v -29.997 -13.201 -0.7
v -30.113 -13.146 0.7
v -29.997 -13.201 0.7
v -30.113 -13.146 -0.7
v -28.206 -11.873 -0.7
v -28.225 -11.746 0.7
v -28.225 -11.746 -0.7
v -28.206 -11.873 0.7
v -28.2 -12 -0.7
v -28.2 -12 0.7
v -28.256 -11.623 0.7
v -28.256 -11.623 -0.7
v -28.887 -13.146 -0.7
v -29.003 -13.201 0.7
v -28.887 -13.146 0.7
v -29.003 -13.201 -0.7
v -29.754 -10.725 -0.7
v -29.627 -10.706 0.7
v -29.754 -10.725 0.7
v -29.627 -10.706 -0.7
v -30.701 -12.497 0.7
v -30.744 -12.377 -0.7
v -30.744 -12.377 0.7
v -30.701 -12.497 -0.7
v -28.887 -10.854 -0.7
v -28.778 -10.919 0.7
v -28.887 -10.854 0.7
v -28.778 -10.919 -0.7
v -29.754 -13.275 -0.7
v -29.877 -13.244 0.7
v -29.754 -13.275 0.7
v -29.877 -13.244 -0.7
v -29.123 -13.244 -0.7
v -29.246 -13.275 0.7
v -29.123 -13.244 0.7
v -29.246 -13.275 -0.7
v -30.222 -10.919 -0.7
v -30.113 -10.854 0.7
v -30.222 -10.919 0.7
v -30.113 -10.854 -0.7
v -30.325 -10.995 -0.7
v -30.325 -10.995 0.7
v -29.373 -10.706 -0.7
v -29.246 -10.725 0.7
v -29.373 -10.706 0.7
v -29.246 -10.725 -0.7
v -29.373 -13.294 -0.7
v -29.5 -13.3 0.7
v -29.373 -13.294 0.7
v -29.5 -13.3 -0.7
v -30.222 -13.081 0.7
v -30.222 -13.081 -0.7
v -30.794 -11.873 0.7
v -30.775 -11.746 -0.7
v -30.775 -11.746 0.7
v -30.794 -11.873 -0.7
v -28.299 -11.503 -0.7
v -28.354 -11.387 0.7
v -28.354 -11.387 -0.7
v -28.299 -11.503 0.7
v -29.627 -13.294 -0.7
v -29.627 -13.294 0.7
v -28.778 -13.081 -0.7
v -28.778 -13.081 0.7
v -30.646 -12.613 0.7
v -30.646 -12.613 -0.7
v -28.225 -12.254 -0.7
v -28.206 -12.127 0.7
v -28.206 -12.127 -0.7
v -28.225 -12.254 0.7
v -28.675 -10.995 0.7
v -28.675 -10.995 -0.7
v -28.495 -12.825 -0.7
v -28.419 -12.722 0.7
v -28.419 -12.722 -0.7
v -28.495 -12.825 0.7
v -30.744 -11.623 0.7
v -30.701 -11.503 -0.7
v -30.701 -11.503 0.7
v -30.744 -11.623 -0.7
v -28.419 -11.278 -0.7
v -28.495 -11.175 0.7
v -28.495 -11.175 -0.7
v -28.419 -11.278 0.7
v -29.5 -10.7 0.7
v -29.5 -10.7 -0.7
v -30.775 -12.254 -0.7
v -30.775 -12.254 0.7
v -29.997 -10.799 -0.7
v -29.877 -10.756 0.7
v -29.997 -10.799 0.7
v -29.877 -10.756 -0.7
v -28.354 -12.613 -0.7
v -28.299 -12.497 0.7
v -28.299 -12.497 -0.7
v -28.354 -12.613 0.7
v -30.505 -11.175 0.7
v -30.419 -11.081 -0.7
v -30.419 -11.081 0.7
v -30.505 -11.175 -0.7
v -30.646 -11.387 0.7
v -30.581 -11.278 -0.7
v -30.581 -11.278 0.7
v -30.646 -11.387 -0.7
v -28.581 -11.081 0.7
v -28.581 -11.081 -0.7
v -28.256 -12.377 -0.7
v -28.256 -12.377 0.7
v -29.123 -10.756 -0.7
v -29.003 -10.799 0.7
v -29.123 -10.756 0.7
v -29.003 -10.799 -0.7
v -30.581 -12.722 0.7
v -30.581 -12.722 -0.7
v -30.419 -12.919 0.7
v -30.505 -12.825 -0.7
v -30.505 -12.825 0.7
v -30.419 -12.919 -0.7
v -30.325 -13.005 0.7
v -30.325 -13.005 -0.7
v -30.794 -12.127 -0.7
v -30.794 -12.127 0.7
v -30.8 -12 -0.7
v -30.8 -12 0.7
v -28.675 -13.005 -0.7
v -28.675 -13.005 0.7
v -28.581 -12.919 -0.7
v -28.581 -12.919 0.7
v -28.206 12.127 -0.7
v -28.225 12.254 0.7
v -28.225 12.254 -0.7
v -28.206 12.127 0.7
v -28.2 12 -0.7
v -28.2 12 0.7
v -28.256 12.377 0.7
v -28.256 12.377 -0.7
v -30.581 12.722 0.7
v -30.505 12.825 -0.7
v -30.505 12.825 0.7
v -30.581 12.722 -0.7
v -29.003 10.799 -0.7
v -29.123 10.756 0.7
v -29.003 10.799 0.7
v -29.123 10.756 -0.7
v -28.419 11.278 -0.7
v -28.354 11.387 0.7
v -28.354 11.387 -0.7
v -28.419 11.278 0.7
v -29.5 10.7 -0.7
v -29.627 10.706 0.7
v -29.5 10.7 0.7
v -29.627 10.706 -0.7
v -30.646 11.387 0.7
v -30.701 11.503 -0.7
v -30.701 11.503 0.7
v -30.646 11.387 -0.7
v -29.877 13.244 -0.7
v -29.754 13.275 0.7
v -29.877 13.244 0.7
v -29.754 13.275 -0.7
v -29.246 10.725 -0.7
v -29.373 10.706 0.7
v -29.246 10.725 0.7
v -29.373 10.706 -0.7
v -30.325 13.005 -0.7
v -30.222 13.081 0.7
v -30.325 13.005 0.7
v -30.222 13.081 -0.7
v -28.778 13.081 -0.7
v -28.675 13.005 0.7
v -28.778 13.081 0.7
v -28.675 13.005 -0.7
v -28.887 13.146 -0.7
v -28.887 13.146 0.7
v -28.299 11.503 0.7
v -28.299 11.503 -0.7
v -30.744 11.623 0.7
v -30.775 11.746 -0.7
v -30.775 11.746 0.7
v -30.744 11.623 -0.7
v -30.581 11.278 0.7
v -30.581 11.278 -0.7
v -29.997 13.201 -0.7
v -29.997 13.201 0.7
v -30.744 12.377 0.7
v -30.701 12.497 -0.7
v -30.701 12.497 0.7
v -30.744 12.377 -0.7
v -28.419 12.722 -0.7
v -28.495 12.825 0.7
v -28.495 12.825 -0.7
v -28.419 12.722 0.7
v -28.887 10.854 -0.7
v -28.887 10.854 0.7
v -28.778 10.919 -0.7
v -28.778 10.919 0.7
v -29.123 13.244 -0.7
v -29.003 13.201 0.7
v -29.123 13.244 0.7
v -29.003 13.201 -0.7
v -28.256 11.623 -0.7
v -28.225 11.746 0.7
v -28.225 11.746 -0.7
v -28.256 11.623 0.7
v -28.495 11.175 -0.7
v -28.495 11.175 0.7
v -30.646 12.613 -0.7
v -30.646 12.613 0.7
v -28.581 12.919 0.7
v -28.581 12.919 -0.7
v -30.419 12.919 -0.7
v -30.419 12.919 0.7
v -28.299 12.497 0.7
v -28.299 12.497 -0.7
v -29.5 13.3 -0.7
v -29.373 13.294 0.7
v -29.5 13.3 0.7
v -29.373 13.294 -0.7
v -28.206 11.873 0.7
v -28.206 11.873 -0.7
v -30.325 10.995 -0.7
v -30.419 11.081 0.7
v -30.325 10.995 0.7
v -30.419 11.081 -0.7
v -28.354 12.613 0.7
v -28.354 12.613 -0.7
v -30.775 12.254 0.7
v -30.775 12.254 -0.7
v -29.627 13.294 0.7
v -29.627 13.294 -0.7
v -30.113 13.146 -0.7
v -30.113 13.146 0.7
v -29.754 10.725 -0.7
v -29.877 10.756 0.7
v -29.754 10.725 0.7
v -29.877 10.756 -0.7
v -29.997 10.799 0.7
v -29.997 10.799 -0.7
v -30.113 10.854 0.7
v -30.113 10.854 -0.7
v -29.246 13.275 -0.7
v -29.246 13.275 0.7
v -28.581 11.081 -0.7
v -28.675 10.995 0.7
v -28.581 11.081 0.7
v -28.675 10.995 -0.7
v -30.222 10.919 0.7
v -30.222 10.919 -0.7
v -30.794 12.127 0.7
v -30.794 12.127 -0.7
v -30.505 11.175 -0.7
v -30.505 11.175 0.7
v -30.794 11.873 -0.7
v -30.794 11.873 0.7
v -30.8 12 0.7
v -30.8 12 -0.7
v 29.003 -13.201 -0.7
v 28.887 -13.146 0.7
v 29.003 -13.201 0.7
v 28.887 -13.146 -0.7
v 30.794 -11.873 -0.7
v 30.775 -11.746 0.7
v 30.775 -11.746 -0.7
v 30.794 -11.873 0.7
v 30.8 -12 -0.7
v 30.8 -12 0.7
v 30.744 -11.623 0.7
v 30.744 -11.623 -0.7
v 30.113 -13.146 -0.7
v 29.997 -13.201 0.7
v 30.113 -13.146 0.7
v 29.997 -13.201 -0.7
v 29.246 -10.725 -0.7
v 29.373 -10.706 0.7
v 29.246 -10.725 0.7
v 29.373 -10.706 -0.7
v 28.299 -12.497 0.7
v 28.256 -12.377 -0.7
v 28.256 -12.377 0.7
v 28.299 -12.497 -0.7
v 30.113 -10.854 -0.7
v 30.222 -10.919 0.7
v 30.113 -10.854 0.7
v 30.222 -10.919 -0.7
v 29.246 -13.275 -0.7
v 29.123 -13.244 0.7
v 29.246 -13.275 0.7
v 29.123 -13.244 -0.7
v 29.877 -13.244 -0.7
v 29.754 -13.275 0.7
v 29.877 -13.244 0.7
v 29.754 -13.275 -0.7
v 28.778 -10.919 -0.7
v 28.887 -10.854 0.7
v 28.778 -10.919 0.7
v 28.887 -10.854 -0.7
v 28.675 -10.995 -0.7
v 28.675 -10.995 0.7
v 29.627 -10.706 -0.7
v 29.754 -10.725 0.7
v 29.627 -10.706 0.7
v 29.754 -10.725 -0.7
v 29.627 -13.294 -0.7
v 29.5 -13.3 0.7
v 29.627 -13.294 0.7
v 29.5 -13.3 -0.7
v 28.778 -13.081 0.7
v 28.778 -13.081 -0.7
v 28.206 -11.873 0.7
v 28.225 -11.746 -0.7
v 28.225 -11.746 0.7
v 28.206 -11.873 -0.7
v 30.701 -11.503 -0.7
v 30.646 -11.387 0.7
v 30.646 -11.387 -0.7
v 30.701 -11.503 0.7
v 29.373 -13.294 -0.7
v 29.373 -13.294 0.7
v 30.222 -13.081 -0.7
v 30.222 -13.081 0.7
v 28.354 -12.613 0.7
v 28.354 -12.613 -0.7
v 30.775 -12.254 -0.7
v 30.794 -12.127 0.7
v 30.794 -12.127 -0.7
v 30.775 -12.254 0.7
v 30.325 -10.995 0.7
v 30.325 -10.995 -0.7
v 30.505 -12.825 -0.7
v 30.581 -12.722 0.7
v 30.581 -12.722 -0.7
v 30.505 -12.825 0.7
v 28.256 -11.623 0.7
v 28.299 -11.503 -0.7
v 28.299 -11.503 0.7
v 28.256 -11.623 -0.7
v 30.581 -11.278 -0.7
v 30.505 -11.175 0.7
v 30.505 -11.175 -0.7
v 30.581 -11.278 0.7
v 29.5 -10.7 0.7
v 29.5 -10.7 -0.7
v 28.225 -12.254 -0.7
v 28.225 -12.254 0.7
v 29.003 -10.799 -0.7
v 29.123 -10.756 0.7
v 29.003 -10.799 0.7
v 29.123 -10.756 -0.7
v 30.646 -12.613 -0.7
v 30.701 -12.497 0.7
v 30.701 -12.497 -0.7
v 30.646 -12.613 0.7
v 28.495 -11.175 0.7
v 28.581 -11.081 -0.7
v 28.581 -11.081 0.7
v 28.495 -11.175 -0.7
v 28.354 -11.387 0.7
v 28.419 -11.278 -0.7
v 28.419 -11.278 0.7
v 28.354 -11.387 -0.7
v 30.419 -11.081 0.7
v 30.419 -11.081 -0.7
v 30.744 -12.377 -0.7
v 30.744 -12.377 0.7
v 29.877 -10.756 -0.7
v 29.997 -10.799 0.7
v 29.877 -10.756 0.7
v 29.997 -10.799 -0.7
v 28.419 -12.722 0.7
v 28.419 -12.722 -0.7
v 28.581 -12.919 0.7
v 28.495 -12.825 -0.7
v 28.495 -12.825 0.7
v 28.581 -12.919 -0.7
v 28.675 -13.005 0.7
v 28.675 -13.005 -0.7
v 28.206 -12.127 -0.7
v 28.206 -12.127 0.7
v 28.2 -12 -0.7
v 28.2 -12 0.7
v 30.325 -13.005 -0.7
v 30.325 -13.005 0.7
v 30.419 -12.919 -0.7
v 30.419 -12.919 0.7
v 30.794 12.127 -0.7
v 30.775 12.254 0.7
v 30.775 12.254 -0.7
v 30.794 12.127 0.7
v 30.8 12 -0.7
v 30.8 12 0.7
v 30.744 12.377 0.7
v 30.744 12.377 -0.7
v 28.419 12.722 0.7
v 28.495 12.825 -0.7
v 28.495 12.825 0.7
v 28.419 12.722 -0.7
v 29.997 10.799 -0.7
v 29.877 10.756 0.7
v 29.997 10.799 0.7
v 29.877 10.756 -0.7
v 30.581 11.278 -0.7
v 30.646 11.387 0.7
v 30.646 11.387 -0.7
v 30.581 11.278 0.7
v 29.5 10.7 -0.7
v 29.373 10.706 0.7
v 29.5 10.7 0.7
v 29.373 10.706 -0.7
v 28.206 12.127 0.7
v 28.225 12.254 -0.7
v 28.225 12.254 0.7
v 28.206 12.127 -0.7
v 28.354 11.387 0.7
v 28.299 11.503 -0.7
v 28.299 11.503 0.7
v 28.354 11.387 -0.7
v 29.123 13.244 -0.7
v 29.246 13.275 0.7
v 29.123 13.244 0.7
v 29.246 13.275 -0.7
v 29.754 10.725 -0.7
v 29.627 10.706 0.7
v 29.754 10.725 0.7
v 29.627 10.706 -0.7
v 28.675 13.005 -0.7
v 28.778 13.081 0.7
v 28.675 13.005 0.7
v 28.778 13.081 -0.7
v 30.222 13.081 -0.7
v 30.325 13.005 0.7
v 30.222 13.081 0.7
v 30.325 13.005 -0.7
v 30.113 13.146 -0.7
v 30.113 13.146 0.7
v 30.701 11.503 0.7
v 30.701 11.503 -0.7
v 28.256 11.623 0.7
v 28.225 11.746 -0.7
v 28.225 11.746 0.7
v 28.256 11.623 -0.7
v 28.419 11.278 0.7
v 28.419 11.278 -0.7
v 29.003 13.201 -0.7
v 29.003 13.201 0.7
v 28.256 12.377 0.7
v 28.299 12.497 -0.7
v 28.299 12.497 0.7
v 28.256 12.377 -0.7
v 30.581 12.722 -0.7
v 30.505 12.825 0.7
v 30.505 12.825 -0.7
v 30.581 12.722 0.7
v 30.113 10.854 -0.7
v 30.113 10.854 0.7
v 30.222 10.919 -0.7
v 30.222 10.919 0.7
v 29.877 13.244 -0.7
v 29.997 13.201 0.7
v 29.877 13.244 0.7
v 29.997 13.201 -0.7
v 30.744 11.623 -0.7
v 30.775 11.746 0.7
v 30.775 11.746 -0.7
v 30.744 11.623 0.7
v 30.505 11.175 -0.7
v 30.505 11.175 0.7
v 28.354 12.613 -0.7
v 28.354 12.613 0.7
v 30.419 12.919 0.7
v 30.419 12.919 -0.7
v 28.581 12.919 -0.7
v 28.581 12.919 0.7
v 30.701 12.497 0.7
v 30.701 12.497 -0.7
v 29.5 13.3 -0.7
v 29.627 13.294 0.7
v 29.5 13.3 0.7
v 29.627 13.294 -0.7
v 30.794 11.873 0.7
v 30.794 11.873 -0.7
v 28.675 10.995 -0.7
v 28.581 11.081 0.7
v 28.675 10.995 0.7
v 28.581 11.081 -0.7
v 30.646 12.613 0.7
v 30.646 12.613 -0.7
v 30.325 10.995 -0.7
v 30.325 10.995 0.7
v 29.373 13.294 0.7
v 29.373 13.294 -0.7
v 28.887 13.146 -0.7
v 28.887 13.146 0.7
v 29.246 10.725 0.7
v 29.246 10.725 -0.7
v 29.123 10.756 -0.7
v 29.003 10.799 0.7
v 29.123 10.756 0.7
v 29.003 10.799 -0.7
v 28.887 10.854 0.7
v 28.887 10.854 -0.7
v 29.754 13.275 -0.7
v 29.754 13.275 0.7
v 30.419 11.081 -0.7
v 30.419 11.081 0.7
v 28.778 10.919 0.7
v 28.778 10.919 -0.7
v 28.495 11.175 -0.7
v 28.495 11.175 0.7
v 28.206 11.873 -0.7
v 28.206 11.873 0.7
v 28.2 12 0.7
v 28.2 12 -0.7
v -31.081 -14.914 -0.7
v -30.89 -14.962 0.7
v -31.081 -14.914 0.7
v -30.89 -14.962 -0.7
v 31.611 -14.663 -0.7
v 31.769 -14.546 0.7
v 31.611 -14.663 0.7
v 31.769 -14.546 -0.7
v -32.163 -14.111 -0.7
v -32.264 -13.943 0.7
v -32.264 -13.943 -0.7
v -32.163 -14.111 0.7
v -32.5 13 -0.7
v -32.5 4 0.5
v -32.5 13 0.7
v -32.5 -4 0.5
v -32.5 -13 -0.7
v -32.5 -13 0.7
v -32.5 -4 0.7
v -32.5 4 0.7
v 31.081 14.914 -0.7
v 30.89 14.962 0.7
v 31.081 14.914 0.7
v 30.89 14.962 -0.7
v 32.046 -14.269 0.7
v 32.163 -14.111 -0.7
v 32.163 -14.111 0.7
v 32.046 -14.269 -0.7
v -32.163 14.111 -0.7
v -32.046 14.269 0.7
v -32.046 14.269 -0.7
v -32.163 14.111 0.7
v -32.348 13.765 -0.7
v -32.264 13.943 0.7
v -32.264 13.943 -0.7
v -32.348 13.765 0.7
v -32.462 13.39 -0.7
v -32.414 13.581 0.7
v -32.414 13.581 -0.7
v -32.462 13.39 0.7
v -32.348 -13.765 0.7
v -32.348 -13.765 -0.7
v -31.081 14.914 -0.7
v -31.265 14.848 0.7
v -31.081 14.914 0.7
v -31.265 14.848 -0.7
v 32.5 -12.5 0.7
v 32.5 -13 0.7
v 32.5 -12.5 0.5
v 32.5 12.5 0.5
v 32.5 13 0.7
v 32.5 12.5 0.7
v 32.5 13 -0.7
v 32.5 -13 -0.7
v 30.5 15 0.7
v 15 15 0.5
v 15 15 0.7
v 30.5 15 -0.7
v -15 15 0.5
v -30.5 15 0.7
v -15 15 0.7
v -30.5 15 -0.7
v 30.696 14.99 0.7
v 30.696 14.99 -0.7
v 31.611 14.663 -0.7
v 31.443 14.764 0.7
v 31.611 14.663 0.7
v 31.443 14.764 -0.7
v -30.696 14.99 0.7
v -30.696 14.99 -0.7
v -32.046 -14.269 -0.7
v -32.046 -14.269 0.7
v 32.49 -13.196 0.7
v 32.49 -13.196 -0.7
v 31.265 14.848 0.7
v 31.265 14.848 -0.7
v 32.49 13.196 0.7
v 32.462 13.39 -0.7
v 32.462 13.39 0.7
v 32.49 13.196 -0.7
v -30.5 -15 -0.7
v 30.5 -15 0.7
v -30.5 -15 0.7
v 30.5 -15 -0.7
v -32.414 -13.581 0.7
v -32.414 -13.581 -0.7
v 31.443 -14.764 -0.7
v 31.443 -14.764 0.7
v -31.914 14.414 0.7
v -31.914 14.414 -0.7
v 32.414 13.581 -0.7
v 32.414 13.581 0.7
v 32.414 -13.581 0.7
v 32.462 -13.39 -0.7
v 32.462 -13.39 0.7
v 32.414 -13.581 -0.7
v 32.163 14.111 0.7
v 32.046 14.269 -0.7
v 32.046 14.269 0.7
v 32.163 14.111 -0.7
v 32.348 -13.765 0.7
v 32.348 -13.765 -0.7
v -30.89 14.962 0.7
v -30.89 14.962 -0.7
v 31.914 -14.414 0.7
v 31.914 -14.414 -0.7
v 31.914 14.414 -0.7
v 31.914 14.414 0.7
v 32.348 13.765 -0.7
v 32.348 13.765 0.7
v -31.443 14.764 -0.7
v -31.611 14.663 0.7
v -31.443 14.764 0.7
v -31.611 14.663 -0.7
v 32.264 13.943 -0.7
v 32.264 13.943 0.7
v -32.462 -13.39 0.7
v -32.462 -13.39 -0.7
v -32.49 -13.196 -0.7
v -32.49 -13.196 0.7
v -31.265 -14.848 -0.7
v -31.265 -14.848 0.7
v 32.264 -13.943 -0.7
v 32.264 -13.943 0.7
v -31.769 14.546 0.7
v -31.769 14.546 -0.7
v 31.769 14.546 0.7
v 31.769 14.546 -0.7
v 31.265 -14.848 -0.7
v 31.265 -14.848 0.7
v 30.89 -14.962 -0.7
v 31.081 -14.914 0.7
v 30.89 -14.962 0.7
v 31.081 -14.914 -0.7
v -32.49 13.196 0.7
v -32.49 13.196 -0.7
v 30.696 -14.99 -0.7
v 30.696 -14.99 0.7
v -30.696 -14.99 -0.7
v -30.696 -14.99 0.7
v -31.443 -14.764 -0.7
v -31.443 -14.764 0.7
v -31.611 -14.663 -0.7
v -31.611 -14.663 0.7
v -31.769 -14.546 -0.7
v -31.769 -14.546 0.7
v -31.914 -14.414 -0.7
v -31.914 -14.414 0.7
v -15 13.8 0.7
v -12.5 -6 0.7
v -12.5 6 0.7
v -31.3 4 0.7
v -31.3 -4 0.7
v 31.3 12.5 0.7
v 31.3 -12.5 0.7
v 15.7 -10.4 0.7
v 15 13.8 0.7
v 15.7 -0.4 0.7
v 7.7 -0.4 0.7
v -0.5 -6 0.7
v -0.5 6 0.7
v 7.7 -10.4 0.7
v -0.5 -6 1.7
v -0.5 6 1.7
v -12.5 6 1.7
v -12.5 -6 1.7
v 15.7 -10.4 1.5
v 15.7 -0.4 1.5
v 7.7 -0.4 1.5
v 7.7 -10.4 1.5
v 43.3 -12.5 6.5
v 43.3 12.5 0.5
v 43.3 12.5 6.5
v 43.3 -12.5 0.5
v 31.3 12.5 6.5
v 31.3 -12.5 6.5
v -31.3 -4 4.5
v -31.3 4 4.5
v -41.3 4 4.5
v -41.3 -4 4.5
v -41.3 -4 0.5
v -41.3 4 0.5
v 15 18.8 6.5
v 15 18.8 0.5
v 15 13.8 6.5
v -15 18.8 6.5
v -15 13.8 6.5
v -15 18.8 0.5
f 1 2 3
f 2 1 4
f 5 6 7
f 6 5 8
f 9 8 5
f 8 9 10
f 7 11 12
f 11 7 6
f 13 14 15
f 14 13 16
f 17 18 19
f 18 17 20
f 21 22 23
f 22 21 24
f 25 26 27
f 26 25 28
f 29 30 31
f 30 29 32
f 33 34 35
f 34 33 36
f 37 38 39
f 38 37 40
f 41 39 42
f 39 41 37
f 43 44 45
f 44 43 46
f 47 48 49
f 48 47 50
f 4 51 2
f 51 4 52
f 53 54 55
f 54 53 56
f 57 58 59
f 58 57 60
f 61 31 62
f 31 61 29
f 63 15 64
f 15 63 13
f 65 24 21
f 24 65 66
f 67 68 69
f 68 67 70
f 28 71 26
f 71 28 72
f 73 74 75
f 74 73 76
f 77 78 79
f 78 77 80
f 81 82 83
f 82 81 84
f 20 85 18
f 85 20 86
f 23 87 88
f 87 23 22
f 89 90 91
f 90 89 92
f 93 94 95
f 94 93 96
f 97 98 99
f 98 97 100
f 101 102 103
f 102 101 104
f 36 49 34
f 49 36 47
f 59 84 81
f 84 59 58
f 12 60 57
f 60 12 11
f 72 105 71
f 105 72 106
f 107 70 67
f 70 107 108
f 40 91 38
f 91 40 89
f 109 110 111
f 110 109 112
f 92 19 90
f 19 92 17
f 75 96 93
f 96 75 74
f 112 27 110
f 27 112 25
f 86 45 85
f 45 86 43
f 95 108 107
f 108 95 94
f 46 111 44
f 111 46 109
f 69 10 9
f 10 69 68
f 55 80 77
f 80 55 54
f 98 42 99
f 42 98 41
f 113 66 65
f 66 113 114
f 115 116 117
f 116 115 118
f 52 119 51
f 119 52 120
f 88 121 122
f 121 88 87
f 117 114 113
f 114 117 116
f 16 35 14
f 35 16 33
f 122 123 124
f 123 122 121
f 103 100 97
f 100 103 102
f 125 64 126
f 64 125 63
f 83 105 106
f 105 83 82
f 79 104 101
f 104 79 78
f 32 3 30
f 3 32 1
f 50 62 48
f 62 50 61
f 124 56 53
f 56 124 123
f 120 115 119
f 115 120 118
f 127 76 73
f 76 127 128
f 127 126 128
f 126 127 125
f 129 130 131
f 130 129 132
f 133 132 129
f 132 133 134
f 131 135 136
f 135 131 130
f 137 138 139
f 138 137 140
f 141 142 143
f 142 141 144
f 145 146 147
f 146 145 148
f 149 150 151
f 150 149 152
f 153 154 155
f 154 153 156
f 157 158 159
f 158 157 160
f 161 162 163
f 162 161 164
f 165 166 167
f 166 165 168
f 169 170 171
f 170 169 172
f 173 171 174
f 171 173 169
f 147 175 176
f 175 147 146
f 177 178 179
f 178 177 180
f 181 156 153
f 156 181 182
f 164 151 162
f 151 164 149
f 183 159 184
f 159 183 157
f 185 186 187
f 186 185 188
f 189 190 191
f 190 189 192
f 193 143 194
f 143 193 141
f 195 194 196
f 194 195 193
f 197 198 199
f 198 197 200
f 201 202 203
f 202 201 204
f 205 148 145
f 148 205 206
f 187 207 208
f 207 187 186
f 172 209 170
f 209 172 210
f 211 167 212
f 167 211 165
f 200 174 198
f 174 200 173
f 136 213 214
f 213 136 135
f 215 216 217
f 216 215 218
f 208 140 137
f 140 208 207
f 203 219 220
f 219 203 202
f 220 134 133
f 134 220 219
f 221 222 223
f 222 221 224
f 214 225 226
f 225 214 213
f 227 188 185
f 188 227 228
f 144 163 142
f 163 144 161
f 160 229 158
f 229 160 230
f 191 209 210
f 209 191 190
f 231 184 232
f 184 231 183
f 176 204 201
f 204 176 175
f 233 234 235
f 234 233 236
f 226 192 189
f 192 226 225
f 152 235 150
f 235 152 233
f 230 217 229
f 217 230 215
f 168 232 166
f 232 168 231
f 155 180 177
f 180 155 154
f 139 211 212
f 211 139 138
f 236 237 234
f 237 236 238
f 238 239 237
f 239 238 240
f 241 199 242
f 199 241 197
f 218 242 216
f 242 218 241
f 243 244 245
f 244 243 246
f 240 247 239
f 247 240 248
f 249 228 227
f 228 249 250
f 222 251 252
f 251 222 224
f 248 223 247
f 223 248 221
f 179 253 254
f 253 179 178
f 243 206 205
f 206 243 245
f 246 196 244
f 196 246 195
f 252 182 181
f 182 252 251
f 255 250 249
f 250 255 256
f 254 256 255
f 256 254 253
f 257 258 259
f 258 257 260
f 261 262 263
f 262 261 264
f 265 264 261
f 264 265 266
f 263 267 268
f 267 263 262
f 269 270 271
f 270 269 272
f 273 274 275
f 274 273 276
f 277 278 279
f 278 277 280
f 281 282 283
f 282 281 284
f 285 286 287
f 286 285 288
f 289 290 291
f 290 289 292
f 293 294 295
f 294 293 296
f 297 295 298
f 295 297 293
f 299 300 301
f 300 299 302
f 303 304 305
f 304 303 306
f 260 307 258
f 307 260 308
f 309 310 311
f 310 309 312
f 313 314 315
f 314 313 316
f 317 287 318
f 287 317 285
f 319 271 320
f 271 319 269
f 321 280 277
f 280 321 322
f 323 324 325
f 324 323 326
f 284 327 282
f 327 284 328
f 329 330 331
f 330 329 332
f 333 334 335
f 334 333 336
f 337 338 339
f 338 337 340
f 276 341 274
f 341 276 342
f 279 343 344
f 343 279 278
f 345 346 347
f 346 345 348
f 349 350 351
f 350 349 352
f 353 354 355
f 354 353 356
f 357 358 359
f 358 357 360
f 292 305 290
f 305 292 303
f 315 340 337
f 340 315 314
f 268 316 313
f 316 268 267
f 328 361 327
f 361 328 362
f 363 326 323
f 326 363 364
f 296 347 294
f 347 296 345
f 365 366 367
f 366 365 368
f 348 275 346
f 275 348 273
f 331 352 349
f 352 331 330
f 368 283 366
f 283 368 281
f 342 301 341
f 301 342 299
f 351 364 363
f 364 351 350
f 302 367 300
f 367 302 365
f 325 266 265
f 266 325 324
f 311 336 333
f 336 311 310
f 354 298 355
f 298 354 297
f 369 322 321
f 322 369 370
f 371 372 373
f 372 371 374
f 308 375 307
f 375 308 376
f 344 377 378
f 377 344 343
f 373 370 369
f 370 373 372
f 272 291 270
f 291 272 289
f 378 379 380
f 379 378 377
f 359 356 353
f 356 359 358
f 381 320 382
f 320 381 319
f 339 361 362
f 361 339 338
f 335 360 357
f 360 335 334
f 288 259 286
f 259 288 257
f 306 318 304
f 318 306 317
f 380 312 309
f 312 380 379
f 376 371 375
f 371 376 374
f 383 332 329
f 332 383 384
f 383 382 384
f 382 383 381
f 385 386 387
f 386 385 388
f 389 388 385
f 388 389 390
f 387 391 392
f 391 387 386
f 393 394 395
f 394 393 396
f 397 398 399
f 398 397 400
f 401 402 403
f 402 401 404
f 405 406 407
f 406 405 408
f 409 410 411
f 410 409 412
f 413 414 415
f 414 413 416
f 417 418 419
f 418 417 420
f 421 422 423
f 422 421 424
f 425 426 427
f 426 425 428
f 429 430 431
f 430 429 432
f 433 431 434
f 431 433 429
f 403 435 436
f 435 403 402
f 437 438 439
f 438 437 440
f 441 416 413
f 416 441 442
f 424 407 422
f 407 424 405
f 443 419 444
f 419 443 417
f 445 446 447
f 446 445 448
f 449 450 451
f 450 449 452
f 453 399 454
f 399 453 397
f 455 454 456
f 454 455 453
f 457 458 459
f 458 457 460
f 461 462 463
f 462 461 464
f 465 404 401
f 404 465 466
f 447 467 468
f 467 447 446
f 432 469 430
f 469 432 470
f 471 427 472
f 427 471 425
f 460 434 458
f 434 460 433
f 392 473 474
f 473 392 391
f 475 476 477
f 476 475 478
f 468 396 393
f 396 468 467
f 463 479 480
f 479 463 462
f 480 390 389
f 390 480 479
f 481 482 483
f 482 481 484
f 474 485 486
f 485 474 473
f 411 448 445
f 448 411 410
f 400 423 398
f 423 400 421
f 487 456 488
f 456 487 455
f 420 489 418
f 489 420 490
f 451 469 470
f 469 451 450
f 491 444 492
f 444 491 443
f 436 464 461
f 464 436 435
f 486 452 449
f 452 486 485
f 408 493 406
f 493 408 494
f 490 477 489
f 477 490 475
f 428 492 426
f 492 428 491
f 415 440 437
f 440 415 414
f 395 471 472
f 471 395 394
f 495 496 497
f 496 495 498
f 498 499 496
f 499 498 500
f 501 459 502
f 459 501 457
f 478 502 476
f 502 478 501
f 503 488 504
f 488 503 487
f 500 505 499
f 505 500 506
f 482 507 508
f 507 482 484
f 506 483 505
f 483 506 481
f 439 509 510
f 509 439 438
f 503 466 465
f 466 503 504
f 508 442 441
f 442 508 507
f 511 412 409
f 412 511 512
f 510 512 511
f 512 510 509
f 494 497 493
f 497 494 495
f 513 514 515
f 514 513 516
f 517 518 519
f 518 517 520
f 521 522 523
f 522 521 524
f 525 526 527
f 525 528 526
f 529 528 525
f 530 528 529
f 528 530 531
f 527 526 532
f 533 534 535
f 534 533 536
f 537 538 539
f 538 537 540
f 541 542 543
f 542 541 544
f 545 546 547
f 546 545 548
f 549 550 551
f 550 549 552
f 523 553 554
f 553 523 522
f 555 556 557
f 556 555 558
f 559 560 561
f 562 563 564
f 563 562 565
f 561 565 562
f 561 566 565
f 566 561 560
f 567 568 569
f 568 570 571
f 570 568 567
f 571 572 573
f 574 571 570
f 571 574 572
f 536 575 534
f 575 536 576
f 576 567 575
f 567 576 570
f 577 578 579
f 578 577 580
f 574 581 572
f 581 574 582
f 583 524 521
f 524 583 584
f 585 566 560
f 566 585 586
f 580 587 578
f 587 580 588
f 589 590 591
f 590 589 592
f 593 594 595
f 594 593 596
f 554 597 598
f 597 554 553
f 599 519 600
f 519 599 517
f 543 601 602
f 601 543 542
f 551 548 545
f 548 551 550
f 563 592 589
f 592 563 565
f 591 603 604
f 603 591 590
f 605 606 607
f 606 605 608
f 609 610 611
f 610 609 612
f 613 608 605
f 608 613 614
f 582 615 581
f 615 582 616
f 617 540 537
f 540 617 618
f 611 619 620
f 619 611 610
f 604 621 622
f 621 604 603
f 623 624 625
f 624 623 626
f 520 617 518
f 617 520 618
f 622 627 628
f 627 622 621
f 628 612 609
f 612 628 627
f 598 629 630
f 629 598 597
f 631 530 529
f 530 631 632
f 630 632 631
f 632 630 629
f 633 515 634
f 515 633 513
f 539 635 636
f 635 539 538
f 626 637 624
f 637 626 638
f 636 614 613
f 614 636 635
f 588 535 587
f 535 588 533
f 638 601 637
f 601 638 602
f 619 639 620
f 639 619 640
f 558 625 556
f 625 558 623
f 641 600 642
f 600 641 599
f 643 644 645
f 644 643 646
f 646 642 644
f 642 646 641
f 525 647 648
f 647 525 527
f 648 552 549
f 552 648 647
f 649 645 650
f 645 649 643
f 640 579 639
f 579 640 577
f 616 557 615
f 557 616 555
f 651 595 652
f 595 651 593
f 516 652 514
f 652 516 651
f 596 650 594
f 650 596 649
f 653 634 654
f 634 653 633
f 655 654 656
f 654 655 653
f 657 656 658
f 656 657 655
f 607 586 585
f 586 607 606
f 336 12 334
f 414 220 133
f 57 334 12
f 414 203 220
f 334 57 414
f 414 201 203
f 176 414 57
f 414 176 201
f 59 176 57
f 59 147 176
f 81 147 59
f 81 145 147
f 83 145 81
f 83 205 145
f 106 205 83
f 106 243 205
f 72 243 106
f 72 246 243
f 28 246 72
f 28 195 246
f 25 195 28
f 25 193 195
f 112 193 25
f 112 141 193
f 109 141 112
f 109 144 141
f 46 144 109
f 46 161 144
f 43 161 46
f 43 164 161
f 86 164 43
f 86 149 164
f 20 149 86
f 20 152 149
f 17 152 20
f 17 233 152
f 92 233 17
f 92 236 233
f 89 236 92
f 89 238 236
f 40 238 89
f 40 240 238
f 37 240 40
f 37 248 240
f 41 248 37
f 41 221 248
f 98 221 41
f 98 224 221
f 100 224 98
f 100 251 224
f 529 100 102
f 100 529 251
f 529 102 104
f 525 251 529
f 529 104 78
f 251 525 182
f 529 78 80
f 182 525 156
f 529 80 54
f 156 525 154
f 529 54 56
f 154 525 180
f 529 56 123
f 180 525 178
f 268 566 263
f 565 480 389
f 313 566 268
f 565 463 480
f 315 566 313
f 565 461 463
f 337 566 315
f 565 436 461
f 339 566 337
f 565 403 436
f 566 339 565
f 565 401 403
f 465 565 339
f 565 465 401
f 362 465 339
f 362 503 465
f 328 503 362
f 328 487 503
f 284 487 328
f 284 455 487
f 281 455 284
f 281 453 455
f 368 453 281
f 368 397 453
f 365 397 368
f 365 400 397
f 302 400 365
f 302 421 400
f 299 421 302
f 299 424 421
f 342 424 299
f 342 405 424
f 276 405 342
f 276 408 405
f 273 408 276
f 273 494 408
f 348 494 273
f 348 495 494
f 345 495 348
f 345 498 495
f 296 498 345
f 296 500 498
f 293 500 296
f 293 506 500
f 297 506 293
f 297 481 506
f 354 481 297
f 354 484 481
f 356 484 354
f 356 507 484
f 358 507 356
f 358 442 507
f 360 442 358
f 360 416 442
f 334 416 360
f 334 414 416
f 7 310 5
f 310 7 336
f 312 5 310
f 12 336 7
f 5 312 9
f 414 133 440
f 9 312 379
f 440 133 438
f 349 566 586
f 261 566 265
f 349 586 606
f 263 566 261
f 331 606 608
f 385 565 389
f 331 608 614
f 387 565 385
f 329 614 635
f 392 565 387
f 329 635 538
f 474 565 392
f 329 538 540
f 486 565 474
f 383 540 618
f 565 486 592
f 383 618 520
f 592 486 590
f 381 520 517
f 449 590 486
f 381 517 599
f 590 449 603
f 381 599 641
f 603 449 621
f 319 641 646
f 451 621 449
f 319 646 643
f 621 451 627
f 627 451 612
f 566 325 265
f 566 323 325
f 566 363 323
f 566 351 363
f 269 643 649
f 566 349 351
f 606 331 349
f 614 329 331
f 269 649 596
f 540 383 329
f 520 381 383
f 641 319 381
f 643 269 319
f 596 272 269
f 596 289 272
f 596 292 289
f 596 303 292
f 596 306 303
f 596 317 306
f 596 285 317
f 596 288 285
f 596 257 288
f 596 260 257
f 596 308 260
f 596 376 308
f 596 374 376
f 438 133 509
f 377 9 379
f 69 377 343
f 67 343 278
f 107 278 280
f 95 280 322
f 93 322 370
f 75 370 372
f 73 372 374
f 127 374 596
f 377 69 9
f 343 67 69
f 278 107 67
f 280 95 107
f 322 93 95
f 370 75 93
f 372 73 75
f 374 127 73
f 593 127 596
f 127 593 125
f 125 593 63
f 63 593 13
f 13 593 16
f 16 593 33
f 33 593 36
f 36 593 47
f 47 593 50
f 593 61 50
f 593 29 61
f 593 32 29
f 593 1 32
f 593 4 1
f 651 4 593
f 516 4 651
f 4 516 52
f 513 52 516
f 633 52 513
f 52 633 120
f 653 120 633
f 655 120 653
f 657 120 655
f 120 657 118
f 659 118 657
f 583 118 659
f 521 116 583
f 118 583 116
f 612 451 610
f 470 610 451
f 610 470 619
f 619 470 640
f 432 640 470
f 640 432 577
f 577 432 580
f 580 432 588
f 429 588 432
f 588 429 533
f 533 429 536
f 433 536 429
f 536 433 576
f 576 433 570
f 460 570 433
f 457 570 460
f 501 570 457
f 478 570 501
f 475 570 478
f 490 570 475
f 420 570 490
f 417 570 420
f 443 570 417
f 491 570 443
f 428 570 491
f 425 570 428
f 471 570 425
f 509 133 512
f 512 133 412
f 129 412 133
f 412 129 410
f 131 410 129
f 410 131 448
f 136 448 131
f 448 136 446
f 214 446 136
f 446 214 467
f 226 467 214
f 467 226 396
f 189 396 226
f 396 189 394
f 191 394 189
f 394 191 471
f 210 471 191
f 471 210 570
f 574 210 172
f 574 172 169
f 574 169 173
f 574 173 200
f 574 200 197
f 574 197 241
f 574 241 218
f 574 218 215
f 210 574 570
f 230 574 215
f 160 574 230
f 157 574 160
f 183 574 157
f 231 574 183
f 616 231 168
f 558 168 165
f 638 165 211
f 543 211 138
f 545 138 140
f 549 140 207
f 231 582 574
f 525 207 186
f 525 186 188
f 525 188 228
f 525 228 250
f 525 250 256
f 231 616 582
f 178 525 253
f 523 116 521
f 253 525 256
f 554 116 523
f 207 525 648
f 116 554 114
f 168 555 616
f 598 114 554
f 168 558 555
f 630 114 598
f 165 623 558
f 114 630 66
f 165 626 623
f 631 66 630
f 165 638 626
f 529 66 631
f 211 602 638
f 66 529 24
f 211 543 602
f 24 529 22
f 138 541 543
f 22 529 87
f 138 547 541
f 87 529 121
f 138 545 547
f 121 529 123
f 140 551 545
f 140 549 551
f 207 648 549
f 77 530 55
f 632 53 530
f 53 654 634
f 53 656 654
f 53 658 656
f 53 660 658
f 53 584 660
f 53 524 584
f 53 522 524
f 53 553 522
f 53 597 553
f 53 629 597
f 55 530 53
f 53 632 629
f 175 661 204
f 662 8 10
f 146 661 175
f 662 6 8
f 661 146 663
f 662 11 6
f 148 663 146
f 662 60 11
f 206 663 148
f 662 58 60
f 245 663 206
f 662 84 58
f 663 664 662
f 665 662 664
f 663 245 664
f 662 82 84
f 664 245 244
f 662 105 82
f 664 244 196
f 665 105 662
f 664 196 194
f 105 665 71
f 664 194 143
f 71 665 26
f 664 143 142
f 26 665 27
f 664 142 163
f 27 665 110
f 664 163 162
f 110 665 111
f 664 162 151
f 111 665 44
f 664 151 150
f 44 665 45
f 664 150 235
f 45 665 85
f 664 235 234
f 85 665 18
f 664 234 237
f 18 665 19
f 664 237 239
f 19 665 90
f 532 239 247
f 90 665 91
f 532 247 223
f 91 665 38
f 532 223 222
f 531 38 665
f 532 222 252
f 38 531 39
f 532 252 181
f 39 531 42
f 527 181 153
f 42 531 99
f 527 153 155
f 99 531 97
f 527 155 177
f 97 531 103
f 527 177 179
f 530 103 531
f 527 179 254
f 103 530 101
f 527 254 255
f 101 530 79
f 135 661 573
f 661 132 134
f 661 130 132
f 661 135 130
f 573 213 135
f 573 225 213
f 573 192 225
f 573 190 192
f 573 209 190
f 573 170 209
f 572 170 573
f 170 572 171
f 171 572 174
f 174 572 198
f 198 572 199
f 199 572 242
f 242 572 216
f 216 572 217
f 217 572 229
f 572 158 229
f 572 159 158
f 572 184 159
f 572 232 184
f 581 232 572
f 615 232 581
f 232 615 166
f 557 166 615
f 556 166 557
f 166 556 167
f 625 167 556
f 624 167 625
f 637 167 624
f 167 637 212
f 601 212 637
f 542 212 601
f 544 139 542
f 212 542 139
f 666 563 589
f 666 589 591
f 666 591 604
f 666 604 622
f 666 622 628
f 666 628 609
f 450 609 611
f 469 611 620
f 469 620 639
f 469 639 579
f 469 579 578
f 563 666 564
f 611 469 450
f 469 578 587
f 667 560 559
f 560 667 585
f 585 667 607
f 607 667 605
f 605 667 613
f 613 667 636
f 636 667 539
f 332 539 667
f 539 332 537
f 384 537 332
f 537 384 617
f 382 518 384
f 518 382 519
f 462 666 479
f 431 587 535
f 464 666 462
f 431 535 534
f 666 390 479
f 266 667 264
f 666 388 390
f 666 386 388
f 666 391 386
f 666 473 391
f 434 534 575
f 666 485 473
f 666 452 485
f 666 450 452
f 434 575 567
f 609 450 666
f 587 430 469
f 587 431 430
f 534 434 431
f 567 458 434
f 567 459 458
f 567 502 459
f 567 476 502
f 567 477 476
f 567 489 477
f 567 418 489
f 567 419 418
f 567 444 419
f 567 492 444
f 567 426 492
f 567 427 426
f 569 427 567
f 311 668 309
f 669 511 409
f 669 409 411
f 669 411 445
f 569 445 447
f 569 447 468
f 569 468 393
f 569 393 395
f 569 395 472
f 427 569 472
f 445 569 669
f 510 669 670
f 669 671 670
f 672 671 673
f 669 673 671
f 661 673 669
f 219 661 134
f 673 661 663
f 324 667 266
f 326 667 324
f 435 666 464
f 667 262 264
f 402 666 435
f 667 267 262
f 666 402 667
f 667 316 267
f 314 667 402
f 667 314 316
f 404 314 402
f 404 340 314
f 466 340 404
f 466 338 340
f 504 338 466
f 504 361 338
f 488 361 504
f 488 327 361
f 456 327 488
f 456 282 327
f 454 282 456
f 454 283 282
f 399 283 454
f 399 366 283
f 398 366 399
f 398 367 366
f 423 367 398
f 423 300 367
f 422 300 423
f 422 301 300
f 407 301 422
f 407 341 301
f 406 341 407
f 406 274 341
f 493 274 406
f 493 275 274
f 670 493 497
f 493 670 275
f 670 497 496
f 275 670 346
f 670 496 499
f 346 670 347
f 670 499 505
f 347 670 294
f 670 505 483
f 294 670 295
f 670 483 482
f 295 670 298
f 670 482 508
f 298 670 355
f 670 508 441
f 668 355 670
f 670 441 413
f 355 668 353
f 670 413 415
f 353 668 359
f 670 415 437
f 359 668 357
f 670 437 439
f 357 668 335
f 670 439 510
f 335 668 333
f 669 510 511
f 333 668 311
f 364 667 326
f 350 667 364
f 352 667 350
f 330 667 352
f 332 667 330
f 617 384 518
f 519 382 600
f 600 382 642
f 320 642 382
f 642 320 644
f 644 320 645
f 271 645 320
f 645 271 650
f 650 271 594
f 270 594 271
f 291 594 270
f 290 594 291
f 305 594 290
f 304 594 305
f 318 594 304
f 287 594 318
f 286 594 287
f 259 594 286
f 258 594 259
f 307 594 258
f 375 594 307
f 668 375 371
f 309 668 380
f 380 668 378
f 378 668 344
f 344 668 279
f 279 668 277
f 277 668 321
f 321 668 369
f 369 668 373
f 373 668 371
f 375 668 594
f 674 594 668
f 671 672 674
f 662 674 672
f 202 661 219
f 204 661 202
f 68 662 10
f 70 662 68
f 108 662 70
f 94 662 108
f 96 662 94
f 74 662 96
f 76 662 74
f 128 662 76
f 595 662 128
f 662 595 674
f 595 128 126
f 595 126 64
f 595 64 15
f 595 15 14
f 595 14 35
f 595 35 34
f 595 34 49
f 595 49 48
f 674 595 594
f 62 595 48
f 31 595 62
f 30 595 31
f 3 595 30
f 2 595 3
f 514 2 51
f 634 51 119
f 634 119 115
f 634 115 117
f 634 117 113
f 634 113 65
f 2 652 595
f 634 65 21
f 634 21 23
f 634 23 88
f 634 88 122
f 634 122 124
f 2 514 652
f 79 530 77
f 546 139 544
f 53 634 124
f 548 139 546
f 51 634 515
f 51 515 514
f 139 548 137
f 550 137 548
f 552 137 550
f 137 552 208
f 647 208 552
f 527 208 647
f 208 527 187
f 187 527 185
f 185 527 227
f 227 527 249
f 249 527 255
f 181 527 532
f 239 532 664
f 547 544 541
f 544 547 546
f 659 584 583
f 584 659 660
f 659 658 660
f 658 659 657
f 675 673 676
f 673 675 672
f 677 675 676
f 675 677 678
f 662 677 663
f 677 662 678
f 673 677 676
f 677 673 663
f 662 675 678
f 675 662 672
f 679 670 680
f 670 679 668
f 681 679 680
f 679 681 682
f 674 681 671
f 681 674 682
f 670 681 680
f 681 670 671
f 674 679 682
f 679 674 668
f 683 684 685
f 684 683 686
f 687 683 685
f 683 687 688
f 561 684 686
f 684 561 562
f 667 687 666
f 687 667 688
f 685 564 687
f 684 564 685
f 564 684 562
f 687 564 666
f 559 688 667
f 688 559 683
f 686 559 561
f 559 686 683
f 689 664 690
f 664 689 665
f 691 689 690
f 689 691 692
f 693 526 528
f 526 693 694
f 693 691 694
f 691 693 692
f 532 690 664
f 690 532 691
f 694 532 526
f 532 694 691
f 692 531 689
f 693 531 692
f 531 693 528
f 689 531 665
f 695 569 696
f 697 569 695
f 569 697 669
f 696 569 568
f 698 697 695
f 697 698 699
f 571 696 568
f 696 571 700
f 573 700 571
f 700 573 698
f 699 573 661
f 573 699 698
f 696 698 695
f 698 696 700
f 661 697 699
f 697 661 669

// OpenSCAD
$fn = 64;

// Target dimensions (PCB only)
pcb_length = 65.0;
pcb_width  = 30.0;
pcb_thickness = 1.4;

// Styling / features
corner_radius = 2.0;
eps = 0.2;                 // small overlap to guarantee connectivity
hole_d = 2.6;              // mounting hole diameter
hole_edge = 3.0;           // hole center offset from edges

// Component sizes (simple SBC features)
chip_size = [12, 12, 1.2];
chip2_size = [8, 10, 1.0];

usb_size = [12, 14, 6];    // x, y, z
usb_inset = 1.0;           // how far connector sits onto PCB

hdmi_size = [10, 8, 4];
hdmi_inset = 1.0;

header_size = [30, 5, 6];
header_inset = 1.0;

module rounded_rect_prism(l, w, h, r) {
    // Centered at origin
    hull() {
        for (sx = [-1, 1])
            for (sy = [-1, 1])
                translate([sx*(l/2 - r), sy*(w/2 - r), 0])
                    cylinder(h=h, r=r, center=true);
    }
}

module pcb_with_holes() {
    difference() {
        rounded_rect_prism(pcb_length, pcb_width, pcb_thickness, corner_radius);

        // 4 mounting holes (through)
        for (sx = [-1, 1])
            for (sy = [-1, 1])
                translate([sx*(pcb_length/2 - hole_edge), sy*(pcb_width/2 - hole_edge), 0])
                    cylinder(h=pcb_thickness + 2*eps, d=hole_d, center=true);
    }
}

module place_on_top(size, x, y) {
    // Places a box on top of PCB with slight overlap into PCB
    translate([x, y, pcb_thickness/2 + size[2]/2 - eps])
        cube(size, center=true);
}

module place_on_side(size, side="right", y=0, z=0, inset=1.0) {
    // Places a box protruding from a PCB edge, overlapping into PCB by inset+eps
    x = (side=="right")
        ? (pcb_length/2 + size[0]/2 - (inset + eps))
        : -(pcb_length/2 + size[0]/2 - (inset + eps));

    translate([x, y, z])
        cube(size, center=true);
}

module sbc() {
    union() {
        // PCB
        pcb_with_holes();

        // Main SoC chip (top)
        place_on_top(chip_size, x = -pcb_length*0.10, y = 0);

        // Secondary chip (top)
        place_on_top(chip2_size, x = pcb_length*0.18, y = -pcb_width*0.18);

        // 2x USB-like connectors on right edge (stacked along Y)
        place_on_side(usb_size, side="right",
                      y =  usb_size[1]/2 - pcb_width*0.05,
                      z = pcb_thickness/2 + usb_size[2]/2 - eps,
                      inset = usb_inset);

        place_on_side(usb_size, side="right",
                      y = -(usb_size[1]/2 - pcb_width*0.05),
                      z = pcb_thickness/2 + usb_size[2]/2 - eps,
                      inset = usb_inset);

        // HDMI-like connector on left edge
        place_on_side(hdmi_size, side="left",
                      y = 0,
                      z = pcb_thickness/2 + hdmi_size[2]/2 - eps,
                      inset = hdmi_inset);

        // Pin header along top edge (positive Y)
        translate([0,
                   pcb_width/2 + header_size[1]/2 - (header_inset + eps),
                   pcb_thickness/2 + header_size[2]/2 - eps])
            cube(header_size, center=true);
    }
}

sbc();
